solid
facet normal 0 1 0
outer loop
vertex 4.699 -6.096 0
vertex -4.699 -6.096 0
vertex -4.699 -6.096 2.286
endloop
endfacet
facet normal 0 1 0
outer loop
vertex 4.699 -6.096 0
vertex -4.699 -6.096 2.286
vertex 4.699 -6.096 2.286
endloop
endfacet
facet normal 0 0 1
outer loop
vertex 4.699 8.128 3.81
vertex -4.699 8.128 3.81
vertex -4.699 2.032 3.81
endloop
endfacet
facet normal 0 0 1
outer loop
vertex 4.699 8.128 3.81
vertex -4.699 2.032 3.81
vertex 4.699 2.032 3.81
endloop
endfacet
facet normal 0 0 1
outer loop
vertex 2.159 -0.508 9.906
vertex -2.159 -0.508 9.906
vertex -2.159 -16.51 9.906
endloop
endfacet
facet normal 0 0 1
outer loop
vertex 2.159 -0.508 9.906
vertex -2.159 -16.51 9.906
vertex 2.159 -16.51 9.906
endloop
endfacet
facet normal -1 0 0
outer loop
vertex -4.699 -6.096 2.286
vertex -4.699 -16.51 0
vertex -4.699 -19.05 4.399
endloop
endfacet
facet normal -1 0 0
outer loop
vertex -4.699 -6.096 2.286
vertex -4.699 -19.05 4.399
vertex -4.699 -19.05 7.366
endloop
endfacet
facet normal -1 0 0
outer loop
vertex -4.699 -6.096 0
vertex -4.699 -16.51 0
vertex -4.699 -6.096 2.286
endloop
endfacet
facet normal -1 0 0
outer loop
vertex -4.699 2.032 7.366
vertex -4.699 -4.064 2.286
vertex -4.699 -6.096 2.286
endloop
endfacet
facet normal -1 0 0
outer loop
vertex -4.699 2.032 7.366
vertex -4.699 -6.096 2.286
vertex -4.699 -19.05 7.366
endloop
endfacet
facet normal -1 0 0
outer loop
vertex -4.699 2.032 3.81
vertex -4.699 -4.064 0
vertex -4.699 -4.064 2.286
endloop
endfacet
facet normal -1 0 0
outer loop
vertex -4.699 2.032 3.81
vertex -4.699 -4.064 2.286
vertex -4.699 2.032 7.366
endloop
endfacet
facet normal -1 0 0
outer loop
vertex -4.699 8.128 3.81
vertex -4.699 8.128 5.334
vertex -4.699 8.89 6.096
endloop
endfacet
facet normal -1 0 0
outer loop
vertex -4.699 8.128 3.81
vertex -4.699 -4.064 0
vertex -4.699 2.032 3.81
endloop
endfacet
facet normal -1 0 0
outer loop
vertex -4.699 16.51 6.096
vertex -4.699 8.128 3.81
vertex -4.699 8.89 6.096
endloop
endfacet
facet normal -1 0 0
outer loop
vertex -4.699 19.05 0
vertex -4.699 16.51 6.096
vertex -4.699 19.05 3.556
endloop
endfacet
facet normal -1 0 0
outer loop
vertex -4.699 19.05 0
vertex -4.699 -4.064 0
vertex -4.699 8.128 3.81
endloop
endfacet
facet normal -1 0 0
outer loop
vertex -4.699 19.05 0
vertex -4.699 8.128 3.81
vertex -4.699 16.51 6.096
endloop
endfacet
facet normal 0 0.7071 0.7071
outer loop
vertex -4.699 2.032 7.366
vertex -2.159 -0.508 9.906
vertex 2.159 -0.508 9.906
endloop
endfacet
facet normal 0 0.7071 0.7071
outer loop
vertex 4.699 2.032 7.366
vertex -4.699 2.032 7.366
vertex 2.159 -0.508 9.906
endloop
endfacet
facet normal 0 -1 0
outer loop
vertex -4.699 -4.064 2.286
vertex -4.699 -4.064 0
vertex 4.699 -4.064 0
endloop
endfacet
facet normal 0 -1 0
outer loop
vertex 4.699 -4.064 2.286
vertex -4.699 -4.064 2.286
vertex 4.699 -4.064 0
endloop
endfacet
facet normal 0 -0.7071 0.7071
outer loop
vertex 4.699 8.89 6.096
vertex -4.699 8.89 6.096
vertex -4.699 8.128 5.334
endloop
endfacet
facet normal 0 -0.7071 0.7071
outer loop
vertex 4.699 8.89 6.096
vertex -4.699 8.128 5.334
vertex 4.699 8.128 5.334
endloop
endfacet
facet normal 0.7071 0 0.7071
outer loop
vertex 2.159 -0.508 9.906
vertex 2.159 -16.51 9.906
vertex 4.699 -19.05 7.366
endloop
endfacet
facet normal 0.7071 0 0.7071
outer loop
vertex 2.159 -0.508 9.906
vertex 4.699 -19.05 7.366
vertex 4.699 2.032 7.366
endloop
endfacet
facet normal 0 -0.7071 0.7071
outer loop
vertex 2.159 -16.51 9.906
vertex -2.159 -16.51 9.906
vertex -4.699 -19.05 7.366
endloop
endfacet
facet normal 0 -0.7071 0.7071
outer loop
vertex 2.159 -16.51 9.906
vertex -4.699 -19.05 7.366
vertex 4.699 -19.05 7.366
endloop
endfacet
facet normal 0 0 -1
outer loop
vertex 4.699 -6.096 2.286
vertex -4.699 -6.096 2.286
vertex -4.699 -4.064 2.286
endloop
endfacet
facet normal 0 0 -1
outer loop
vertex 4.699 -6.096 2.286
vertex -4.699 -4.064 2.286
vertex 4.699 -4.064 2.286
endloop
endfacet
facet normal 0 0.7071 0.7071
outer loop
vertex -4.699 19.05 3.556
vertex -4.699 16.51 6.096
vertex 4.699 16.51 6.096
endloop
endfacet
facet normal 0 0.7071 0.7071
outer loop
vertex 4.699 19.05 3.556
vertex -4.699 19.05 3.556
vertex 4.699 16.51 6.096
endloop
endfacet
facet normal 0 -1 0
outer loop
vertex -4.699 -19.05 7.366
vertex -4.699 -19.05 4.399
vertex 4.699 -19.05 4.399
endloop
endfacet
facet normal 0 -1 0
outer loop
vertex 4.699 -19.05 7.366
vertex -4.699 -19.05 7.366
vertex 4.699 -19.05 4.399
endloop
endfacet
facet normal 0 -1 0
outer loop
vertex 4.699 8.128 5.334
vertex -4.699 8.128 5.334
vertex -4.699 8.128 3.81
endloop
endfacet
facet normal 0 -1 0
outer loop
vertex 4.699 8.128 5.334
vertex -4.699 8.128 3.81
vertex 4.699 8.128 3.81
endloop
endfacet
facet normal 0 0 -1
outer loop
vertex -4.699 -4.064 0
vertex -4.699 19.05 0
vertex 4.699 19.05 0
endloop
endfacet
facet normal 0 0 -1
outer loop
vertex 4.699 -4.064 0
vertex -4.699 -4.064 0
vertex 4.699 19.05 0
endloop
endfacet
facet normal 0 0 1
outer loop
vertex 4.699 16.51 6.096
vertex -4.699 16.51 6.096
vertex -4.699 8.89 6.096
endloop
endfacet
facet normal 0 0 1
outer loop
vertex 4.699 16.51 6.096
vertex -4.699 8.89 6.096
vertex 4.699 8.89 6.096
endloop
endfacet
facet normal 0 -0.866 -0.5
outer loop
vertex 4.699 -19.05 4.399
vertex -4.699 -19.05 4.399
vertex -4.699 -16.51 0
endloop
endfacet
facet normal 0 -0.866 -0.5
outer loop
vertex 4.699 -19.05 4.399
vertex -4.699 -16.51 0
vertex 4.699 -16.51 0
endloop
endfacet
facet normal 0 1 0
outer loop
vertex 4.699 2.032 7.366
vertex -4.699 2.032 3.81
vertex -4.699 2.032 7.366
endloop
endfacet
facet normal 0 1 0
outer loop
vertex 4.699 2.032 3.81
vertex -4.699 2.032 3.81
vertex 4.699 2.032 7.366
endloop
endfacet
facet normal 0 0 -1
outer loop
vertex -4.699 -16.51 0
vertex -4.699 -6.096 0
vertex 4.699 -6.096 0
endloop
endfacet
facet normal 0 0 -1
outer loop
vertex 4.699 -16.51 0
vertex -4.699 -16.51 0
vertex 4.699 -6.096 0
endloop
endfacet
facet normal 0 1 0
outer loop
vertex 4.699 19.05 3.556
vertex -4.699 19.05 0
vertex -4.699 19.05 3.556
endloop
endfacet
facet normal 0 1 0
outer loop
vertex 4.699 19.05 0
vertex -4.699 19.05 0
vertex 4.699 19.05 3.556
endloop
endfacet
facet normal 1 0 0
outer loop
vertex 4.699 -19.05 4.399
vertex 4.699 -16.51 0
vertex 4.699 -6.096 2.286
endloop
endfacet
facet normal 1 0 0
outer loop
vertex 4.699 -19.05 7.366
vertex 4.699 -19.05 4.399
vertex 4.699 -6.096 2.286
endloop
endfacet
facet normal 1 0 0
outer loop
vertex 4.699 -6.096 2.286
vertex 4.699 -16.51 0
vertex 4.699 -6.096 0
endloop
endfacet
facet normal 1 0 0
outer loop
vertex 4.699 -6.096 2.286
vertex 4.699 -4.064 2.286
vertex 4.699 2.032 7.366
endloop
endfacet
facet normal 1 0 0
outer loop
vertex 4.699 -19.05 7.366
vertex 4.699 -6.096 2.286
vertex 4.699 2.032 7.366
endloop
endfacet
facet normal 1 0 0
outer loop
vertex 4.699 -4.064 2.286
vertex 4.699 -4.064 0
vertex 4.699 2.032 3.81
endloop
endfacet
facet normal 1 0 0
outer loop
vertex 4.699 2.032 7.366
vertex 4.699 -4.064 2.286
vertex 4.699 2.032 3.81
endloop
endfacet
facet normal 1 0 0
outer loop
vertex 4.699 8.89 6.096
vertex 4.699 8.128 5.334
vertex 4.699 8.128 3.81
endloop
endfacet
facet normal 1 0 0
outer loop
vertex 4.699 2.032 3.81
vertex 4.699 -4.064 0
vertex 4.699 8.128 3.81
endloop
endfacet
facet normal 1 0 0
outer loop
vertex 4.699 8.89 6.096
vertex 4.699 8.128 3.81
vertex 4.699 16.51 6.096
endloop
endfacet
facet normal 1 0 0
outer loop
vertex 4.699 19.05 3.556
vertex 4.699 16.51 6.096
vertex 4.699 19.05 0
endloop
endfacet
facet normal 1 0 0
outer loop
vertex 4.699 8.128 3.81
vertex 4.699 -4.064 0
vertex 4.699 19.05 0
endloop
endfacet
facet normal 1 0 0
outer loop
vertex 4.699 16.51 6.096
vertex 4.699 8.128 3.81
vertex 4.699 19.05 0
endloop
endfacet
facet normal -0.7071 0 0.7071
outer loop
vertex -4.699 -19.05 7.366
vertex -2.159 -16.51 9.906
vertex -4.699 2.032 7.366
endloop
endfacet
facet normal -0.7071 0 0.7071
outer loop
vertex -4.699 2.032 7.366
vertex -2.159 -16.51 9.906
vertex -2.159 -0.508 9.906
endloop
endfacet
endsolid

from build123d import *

# Parameters (mm, degrees)
F0_W     = 9.398
F0_H     = 38.1
F1_DEPTH = 6.096
F2_W     = 9.398
F2_H     = 3.048
F3_DEPTH = 2.286
F4_W     = 9.398
F4_H     = 1.016
F5_DEPTH = 2.286
F6_SIZE2 = 4.3994090512
F6_SIZE  = 2.54
F7_SIZE  = 2.54
F8_DEPTH = 3.81
F9_SIZE  = 2.54
F10_SIZE = 0.762


with BuildPart() as f1:
    # F0 (on Top) → F1 (new body)
    with BuildSketch(Plane.XY):
        Rectangle(F0_W, F0_H)
    extrude(amount=F1_DEPTH)

    # F2 (on face) → F3 (cut)
    with BuildSketch(Plane.XY.offset(6.096)):
        with Locations((0, 6.604)):
            Rectangle(F2_W, F2_H)
        with Locations((0, 3.556)):
            Rectangle(F2_W, F2_H)
    extrude(amount=-F3_DEPTH, mode=Mode.SUBTRACT)

    # F4 (on face) → F5 (cut)
    with BuildSketch(Plane(origin=(0, 0, 0), x_dir=(1, 0, 0), z_dir=(0, 0, -1))):
        with Locations((0, 5.588)):
            Rectangle(F4_W, F4_H)
        with Locations((0, 4.572)):
            Rectangle(F4_W, F4_H)
    extrude(amount=-F5_DEPTH, mode=Mode.SUBTRACT)

    # F6
    f6_edges = [f1.edges().sort_by_distance(p)[0] for p in [
        (0, -19.05, 0),
    ]]
    f6_side = f1.faces().sort_by_distance((0, -12.573, 0))[0]
    chamfer(f6_edges, length=F6_SIZE, length2=F6_SIZE2, reference=f6_side)

    # F7
    f7_edges = [f1.edges().sort_by_distance(p)[0] for p in [
        (0, 19.05, 6.096),
    ]]
    chamfer(f7_edges, length=F7_SIZE)

    # F8 (add): a face of the model
    f8_faces = [f1.faces().sort_by_distance(p)[0] for p in [
        (0, -8.509, 6.096),
    ]]
    extrude(f8_faces, amount=F8_DEPTH)

    # F9
    f9_edges = [f1.edges().sort_by_distance(p)[0] for p in [
        (0, 2.032, 9.906),
        (0, -19.05, 9.906),
        (-4.699, -8.509, 9.906),
        (4.699, -8.509, 9.906),
    ]]
    chamfer(f9_edges, length=F9_SIZE)

    # F10
    f10_edges = [f1.edges().sort_by_distance(p)[0] for p in [
        (0, 8.128, 6.096),
    ]]
    chamfer(f10_edges, length=F10_SIZE)


solid = f1.part
